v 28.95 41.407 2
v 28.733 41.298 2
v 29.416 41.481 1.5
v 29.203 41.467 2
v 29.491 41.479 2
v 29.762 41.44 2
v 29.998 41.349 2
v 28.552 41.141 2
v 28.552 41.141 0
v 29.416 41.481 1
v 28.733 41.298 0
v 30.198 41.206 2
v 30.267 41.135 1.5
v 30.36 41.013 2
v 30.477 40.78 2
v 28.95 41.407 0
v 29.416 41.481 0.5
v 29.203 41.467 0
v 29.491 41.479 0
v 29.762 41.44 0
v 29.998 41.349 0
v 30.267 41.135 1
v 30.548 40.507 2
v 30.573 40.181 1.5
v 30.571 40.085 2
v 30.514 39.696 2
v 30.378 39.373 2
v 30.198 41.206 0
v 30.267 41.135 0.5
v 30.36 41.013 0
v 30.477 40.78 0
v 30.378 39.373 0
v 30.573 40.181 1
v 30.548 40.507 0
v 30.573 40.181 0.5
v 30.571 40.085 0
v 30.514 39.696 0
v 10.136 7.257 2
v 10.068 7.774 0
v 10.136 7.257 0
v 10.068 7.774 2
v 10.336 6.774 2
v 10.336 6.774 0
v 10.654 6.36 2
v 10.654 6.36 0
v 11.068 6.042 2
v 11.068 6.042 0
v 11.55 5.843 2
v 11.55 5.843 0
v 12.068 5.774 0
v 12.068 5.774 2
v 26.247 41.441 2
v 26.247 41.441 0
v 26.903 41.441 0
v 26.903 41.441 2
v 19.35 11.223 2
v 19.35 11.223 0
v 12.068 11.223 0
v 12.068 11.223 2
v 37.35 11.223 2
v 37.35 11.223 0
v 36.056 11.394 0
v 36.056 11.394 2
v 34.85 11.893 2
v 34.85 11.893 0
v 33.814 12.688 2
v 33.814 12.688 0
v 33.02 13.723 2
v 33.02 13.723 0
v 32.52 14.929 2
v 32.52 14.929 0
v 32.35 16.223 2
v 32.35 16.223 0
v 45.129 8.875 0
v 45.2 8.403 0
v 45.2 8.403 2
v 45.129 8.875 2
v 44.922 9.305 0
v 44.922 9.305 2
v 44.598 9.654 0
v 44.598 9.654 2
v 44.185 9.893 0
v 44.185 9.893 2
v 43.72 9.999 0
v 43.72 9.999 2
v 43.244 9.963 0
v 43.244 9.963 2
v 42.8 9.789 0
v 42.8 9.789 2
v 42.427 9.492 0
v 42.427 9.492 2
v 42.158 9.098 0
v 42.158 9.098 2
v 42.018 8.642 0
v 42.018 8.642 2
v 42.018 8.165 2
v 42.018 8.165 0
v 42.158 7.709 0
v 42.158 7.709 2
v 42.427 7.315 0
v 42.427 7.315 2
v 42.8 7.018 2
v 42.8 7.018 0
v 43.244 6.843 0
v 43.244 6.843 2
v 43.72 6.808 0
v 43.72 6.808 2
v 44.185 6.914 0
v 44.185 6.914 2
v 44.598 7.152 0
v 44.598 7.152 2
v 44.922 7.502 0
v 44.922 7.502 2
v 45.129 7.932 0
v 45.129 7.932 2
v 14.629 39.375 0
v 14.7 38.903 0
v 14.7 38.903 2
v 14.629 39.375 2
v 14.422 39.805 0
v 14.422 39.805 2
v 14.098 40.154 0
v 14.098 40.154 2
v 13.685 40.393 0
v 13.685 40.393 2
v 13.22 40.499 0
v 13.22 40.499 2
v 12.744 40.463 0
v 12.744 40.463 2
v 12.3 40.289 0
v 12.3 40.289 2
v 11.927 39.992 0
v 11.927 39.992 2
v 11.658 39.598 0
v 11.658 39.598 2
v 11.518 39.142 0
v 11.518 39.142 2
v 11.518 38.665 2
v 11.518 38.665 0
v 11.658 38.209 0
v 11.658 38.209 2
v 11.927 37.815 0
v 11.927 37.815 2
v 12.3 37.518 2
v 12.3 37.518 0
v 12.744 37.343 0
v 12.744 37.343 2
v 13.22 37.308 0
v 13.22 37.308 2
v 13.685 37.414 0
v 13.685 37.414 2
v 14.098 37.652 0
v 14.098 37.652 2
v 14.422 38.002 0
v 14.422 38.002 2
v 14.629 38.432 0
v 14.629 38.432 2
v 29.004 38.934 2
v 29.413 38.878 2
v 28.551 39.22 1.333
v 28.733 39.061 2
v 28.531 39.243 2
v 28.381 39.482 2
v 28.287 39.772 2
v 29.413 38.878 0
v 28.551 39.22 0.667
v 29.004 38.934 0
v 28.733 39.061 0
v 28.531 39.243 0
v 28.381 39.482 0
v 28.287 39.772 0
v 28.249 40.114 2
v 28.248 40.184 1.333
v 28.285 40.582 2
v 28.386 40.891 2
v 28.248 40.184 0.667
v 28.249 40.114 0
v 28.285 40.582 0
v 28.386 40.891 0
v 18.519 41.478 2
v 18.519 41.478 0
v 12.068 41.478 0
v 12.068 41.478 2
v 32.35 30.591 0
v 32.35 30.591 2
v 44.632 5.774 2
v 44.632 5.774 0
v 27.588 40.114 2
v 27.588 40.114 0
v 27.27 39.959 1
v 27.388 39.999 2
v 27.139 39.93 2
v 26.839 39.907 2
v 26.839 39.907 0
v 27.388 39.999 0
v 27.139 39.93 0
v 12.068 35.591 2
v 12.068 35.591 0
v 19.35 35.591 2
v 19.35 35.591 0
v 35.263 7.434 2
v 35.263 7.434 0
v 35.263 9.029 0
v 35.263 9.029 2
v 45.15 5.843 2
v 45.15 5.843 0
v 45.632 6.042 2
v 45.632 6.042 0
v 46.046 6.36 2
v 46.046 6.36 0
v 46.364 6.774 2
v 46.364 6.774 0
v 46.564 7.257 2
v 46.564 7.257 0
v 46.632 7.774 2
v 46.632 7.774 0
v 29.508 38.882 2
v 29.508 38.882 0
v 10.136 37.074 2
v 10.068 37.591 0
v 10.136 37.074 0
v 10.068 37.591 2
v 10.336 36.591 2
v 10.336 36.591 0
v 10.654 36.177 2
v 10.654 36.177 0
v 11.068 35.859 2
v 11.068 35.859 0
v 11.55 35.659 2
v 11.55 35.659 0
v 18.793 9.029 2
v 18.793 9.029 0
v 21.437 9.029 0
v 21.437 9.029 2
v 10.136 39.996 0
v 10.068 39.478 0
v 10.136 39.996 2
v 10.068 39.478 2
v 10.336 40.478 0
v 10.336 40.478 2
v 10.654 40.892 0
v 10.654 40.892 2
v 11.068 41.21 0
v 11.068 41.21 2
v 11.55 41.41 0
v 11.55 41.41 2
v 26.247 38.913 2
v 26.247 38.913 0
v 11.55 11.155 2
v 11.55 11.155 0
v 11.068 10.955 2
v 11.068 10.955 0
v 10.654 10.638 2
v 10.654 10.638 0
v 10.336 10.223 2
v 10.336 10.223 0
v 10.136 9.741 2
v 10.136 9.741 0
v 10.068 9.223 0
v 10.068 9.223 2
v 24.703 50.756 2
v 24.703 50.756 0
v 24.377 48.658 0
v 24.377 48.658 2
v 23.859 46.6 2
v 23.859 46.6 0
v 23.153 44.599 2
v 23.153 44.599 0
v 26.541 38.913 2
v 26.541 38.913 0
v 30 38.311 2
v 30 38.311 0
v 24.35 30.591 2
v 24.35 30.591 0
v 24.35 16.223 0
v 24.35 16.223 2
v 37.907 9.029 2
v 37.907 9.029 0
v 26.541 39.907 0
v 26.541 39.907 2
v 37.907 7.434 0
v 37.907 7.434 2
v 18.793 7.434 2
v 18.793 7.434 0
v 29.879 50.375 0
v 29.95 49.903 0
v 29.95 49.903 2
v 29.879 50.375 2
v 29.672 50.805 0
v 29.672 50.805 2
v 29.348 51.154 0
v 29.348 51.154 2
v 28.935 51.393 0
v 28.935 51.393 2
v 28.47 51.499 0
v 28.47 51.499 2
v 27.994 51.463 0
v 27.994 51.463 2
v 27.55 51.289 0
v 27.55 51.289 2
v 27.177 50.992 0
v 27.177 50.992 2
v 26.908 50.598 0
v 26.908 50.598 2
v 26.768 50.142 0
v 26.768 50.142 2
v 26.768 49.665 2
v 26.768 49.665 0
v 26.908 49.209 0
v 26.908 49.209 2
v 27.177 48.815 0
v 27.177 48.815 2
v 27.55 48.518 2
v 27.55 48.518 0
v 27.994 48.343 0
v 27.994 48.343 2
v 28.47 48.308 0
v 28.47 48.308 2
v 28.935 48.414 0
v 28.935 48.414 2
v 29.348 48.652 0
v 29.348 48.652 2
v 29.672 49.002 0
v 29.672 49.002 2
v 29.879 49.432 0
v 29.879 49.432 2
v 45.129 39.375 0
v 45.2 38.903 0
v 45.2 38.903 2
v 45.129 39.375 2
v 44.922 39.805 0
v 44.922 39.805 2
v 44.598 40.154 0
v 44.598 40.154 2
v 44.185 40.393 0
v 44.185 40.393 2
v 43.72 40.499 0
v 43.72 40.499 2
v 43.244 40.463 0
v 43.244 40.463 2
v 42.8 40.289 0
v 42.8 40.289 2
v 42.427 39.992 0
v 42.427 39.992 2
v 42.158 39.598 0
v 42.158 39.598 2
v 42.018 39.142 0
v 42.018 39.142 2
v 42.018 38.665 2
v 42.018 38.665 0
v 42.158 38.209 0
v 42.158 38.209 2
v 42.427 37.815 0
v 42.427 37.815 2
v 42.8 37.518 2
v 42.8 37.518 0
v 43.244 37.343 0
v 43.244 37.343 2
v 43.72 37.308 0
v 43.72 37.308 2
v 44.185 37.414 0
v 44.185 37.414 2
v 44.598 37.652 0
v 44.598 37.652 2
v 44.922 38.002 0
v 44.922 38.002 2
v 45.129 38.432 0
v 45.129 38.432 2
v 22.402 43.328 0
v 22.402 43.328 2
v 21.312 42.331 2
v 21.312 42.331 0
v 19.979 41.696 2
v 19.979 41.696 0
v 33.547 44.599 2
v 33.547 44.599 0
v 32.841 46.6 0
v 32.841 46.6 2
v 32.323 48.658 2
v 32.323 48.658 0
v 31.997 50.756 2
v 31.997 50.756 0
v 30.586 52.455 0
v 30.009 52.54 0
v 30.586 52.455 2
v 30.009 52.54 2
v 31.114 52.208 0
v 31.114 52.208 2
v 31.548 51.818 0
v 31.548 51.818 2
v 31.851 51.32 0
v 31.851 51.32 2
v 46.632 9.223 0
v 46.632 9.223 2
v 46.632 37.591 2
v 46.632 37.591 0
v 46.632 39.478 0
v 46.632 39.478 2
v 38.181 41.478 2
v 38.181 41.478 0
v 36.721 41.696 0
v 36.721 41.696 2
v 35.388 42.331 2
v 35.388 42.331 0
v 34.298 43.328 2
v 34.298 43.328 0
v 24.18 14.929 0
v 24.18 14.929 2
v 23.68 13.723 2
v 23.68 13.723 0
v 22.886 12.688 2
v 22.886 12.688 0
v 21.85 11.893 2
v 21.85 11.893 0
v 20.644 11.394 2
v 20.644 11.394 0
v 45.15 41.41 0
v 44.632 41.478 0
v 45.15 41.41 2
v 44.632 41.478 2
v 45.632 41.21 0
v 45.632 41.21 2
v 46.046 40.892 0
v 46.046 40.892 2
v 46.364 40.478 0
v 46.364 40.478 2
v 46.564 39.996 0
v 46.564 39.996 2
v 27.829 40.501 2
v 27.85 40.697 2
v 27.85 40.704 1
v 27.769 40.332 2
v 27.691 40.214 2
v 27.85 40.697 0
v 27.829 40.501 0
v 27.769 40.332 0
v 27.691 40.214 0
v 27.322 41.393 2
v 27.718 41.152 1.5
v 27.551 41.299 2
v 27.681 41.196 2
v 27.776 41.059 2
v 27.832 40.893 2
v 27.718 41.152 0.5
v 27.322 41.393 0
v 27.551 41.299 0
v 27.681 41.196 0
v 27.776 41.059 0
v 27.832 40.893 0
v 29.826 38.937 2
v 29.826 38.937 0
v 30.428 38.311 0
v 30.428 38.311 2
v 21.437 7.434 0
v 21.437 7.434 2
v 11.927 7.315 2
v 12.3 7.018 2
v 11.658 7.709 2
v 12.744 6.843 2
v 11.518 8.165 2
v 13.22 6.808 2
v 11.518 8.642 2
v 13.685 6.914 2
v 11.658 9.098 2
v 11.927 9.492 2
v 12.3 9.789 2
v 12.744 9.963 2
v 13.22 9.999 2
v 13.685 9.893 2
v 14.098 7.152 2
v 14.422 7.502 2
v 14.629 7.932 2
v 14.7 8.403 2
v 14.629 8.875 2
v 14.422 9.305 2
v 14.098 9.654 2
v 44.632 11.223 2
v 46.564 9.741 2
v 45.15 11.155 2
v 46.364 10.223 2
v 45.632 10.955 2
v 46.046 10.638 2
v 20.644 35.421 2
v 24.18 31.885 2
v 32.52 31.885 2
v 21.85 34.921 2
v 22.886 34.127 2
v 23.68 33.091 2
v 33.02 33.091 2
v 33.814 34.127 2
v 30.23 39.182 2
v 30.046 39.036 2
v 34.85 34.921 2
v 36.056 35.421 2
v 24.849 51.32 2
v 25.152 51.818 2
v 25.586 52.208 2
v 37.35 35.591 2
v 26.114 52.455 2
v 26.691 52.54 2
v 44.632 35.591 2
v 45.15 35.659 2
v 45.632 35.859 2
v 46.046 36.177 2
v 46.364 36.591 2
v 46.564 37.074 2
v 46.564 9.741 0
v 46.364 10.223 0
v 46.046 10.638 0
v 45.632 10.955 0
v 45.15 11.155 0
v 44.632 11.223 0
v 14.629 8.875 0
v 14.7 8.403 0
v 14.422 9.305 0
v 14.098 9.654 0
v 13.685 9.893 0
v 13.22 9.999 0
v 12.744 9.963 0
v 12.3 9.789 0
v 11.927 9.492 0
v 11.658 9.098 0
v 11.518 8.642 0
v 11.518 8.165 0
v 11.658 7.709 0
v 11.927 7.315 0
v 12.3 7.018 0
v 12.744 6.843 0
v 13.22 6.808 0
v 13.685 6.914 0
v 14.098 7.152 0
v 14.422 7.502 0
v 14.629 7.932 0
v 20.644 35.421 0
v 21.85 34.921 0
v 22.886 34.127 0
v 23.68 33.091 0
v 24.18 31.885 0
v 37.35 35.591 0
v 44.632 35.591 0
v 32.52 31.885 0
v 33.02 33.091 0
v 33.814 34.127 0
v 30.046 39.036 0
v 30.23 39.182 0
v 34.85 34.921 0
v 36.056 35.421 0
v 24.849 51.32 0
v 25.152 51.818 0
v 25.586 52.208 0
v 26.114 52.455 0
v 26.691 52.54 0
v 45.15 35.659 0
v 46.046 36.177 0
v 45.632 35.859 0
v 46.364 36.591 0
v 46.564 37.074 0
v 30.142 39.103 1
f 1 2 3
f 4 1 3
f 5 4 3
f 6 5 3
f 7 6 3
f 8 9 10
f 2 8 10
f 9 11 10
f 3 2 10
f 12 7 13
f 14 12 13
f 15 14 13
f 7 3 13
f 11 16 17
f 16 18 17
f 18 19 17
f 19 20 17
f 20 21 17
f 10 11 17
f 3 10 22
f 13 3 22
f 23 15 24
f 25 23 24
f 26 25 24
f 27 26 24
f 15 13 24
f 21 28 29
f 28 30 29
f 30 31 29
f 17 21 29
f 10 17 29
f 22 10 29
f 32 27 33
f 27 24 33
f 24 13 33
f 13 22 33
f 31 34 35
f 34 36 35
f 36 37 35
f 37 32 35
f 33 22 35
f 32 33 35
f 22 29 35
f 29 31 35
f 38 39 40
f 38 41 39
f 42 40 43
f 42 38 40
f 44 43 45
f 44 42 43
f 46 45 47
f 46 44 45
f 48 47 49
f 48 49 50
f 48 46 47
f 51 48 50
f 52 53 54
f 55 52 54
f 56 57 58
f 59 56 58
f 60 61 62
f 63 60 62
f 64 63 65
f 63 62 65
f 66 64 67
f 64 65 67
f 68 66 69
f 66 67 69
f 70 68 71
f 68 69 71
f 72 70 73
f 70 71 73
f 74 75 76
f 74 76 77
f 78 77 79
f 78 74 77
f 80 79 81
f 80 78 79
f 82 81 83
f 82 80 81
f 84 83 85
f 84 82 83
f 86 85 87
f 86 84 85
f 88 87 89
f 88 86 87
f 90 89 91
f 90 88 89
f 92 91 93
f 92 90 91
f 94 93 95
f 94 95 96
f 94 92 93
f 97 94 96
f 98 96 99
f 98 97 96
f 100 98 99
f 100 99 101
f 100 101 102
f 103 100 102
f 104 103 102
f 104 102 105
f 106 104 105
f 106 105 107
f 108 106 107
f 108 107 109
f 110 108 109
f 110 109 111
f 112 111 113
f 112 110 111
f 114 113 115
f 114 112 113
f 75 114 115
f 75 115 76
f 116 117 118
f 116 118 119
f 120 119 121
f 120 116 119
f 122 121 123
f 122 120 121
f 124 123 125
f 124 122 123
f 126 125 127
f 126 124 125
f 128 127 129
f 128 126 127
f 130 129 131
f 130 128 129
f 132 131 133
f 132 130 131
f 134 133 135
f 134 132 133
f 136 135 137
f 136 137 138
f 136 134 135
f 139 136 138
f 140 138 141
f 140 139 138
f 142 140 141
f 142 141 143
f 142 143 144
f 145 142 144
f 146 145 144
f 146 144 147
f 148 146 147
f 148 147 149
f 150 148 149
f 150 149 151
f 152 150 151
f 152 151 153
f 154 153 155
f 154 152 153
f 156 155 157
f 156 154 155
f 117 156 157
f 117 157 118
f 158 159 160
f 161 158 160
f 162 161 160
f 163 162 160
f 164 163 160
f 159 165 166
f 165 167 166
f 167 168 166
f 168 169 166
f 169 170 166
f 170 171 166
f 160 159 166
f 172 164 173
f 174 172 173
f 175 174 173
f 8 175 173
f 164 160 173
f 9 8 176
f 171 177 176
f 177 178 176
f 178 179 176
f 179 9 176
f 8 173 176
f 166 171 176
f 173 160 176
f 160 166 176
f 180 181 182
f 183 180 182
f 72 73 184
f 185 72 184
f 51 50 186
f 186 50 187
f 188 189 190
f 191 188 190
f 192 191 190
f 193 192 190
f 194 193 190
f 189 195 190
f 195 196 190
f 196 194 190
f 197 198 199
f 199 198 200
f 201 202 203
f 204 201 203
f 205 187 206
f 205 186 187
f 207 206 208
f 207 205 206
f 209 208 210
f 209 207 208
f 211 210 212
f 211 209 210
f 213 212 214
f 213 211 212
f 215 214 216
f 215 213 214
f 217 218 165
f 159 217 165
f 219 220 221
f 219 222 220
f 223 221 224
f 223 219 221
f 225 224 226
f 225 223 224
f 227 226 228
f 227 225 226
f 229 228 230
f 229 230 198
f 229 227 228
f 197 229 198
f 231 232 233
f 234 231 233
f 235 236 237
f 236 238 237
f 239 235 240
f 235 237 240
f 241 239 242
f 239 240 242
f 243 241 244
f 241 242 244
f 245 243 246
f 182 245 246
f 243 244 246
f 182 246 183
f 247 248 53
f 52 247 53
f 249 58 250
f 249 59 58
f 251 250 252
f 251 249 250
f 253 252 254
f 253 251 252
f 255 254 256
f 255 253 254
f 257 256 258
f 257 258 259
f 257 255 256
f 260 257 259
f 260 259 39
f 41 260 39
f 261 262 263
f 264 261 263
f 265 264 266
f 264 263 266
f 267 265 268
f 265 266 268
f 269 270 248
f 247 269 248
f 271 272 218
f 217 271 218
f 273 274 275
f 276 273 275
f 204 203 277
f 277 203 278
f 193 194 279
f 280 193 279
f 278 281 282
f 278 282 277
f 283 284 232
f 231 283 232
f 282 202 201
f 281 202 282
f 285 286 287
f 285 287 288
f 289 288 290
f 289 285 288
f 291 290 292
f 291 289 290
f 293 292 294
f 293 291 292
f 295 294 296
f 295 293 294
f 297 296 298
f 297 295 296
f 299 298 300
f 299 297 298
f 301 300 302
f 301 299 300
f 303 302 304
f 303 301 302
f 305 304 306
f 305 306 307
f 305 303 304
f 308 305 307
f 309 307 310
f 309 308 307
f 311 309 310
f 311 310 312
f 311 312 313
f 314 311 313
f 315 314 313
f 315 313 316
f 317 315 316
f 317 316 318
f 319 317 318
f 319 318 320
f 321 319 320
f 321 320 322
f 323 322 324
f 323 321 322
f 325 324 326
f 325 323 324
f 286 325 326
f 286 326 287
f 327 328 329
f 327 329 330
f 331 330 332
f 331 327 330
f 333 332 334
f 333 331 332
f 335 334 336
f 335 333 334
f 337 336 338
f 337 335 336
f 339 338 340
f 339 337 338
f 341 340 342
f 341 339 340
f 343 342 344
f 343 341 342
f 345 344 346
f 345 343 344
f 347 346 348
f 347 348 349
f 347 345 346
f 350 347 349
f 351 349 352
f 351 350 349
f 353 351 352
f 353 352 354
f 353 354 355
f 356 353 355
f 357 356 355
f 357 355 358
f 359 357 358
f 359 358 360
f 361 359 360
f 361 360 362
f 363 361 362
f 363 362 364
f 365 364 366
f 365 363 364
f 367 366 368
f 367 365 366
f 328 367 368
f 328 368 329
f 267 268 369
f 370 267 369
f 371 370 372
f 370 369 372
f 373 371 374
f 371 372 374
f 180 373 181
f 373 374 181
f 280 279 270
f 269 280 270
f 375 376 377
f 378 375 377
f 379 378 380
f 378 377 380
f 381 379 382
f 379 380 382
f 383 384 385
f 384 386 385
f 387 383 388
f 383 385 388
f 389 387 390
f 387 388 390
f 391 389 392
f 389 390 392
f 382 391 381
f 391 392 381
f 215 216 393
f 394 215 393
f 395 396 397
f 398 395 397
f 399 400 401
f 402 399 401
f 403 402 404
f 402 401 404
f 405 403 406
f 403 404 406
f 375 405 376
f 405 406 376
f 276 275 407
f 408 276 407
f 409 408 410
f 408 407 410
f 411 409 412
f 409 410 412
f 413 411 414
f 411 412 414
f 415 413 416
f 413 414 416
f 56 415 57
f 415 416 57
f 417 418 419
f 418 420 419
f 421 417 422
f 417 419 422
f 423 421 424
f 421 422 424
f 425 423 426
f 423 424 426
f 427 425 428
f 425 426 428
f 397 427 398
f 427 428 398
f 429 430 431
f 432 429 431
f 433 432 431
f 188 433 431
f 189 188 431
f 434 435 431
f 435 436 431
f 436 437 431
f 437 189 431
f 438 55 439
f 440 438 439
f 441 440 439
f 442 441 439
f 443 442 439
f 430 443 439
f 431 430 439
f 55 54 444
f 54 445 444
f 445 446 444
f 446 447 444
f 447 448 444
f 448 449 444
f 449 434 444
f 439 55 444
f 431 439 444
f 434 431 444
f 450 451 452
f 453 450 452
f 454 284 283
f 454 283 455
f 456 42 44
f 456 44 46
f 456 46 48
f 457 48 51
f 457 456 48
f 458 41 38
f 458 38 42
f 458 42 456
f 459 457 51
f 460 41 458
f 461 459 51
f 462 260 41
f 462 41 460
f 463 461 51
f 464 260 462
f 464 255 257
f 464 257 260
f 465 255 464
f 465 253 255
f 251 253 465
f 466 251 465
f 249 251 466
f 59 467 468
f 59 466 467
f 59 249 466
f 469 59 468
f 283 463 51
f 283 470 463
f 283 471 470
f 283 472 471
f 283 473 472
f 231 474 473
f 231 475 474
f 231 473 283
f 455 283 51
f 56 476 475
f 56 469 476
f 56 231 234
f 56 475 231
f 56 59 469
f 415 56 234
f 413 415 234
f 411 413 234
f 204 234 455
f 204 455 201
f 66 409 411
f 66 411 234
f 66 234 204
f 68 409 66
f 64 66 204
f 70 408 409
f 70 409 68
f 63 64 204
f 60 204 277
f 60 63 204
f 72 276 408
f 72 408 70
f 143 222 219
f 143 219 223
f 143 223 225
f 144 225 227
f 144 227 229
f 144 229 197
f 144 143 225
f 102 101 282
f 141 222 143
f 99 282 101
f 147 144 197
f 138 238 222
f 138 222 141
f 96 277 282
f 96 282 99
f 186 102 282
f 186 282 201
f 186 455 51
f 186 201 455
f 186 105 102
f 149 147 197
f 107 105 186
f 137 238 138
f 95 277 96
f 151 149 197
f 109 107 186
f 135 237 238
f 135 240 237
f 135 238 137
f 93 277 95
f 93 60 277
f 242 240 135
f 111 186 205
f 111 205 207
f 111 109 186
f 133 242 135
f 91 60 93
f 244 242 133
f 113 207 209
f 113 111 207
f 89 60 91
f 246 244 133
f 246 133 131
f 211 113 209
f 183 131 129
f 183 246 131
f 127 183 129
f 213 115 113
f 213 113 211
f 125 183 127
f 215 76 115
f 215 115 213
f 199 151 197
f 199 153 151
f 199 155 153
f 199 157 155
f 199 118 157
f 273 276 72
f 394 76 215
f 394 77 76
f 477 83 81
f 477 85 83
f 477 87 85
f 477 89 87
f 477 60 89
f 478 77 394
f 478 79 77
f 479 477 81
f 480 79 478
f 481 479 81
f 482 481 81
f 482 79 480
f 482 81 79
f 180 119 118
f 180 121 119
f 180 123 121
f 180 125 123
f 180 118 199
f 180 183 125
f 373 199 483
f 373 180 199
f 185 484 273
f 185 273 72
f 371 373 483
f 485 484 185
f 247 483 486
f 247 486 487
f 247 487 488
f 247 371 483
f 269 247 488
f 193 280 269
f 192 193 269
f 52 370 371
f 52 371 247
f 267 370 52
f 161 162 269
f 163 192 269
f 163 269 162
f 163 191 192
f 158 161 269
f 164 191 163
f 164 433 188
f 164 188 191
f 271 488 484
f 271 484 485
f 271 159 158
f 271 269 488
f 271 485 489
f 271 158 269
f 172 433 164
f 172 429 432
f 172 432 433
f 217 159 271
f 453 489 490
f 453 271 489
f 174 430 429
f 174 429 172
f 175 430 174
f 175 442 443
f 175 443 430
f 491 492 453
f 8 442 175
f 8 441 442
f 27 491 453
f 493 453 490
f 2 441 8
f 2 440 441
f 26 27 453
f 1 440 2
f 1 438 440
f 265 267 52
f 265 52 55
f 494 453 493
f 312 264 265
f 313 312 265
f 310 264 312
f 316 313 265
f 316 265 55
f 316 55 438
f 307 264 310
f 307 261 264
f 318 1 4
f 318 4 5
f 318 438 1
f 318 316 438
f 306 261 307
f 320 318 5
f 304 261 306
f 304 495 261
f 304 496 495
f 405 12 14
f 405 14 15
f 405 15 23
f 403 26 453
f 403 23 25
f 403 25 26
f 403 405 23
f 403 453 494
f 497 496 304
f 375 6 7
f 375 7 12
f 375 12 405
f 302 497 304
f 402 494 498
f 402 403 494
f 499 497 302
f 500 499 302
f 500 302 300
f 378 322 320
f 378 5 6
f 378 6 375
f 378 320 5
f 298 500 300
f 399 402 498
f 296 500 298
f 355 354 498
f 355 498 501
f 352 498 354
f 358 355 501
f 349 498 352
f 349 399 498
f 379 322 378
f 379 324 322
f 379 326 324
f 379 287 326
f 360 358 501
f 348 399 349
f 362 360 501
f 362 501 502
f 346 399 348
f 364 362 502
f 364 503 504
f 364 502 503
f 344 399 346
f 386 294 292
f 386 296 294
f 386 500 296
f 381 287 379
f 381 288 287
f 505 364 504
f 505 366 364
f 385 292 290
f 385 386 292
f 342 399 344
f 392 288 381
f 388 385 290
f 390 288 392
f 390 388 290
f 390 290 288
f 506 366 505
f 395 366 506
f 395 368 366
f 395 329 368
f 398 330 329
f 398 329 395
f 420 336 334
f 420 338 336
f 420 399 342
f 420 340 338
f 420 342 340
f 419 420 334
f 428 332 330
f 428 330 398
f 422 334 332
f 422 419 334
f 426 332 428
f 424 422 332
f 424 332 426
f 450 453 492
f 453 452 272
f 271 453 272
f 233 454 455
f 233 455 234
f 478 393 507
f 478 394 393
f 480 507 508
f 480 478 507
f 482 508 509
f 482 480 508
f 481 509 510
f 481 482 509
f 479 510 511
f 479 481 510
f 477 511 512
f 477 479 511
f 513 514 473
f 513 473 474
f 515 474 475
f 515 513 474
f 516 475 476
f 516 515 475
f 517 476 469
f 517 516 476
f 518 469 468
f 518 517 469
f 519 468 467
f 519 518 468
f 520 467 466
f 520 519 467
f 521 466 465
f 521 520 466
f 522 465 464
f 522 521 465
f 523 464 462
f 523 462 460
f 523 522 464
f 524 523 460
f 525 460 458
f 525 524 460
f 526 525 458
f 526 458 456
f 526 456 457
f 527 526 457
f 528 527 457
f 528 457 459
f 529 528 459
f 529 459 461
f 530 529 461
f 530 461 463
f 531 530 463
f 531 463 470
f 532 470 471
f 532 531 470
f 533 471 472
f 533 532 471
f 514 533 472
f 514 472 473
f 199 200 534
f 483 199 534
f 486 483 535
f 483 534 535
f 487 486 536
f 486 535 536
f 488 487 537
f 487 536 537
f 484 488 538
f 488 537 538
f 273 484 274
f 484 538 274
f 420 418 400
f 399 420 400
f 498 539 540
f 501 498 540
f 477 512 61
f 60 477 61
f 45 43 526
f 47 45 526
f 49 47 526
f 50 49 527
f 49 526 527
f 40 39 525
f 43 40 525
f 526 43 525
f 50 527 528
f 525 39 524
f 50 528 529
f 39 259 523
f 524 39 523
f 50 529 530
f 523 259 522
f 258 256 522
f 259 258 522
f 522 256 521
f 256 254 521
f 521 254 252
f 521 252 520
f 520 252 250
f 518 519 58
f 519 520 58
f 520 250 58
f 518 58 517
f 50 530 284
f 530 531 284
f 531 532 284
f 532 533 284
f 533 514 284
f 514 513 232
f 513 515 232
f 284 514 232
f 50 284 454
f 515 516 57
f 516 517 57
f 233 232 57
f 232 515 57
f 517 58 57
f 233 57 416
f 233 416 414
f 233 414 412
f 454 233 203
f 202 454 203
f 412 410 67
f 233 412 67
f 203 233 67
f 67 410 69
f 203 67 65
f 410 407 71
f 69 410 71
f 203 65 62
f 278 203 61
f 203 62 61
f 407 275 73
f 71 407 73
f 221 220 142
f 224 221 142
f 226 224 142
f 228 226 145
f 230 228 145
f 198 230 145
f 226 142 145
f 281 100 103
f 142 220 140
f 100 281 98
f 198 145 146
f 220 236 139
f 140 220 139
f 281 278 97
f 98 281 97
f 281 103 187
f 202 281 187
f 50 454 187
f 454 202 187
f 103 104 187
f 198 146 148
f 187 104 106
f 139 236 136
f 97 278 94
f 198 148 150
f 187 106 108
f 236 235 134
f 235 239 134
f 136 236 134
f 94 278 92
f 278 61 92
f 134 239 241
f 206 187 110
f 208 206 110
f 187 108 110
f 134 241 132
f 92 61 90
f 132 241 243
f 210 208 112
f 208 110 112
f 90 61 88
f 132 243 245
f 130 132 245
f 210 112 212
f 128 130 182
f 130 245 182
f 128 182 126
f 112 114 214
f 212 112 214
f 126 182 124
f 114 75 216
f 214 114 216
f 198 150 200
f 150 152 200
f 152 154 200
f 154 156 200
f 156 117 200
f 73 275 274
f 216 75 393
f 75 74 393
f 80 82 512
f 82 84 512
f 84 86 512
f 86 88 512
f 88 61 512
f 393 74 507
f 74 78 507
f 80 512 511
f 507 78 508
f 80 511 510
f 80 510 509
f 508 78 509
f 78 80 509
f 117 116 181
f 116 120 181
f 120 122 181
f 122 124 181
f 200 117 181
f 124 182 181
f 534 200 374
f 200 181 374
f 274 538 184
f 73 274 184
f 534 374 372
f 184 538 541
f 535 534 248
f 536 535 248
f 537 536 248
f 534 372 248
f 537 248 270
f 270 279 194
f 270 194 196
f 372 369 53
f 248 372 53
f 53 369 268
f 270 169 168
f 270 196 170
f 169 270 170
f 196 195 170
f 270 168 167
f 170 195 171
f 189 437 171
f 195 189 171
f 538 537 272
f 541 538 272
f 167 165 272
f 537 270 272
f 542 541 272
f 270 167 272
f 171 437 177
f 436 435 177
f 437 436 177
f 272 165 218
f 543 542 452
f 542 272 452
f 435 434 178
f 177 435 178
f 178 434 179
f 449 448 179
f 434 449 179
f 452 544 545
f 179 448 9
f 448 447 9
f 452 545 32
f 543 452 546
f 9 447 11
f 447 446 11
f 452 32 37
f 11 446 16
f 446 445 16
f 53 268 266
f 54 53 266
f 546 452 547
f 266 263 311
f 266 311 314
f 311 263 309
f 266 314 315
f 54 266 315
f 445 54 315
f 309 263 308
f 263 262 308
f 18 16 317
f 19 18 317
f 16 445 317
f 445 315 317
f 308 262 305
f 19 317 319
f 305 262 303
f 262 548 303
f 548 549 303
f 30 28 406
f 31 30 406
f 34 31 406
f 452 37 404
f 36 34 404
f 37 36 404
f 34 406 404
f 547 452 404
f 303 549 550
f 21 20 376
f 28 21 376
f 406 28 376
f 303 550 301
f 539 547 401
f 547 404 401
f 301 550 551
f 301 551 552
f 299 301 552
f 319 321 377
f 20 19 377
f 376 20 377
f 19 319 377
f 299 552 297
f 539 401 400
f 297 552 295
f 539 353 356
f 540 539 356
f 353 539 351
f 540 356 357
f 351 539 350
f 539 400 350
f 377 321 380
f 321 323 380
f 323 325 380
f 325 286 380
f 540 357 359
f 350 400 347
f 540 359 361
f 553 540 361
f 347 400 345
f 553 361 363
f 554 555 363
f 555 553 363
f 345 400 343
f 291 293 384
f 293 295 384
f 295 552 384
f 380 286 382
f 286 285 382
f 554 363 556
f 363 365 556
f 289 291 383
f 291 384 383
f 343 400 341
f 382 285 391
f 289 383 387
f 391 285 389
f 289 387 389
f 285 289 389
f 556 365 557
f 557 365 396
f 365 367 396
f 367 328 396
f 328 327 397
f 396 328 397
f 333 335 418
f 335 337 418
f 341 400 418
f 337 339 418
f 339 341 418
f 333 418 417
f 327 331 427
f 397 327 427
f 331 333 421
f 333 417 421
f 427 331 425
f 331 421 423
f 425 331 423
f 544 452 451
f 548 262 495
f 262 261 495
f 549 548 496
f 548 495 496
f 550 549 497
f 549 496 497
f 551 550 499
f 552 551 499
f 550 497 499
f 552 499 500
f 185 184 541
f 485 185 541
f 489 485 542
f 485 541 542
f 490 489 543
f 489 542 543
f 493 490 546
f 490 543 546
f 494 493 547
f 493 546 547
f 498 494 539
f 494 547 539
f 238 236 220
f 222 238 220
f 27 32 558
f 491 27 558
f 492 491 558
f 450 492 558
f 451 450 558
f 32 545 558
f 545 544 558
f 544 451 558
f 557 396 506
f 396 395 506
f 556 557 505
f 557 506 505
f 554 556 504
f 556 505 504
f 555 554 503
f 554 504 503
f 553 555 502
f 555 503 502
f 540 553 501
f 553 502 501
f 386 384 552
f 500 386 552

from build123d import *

# Parameters (mm, degrees)
F0_R     = 1.6
F0_W     = 2.644199878
F0_H     = 1.5956377611
F1_DEPTH = 2
F2_R     = 2
F3_R     = 2


with BuildPart() as f1:
    # F0 (on Top) → F1 (new body)
    with BuildSketch(Plane.XY):
        with BuildLine():
            Line((10.0678037852, 41.4781346917), (10.0678037852, 40.3846651316))
            Line((10.0678037852, 40.3846651316), (10.0678037852, 35.5912074447))
            Line((10.0678037852, 35.5912074447), (19.349999167, 35.5912074447))
            ThreePointArc((19.349999167, 35.5912074447), (22.885533073, 34.1267413506), (24.349999167, 30.5912074447))
            Line((24.349999167, 30.5912074447), (24.349999167, 16.2233320251))
            ThreePointArc((24.349999167, 16.2233320251), (22.885533073, 12.6877981192), (19.349999167, 11.2233320251))
            Line((19.349999167, 11.2233320251), (10.0678037852, 11.2233320251))
            Line((10.0678037852, 11.2233320251), (10.0678037852, 5.7744667865))
            Line((10.0678037852, 5.7744667865), (46.6321945488, 5.7744667865))
            Line((46.6321945488, 5.7744667865), (46.6321945488, 11.2233320251))
            Line((46.6321945488, 11.2233320251), (37.349999167, 11.2233320251))
            ThreePointArc((37.349999167, 11.2233320251), (33.8144652611, 12.6877981192), (32.349999167, 16.2233320251))
            Line((32.349999167, 16.2233320251), (32.349999167, 24.7527061179))
            Line((32.349999167, 24.7527061179), (32.349999167, 30.5912074447))
            ThreePointArc((32.349999167, 30.5912074447), (33.8144652611, 34.1267413506), (37.349999167, 35.5912074447))
            Line((37.349999167, 35.5912074447), (46.6321945488, 35.5912074447))
            Line((46.6321945488, 35.5912074447), (46.6321945488, 40.3846651316))
            Line((46.6321945488, 40.3846651316), (46.6321945488, 41.4781346917))
            Line((46.6321945488, 41.4781346917), (38.1808124264, 41.4781346917))
            ThreePointArc((38.1808124264, 41.4781346917), (35.3876764753, 42.3310403404), (33.5474530963, 44.5987780681))
            ThreePointArc((33.5474530963, 44.5987780681), (32.3571350428, 48.4950101781), (31.87418136, 52.5402836502))
            Line((31.87418136, 52.5402836502), (28.349999167, 52.5402836502))
            Line((28.349999167, 52.5402836502), (24.825816974, 52.5402836502))
            ThreePointArc((24.825816974, 52.5402836502), (24.3428632913, 48.4950101781), (23.1525452378, 44.5987780681))
            ThreePointArc((23.1525452378, 44.5987780681), (21.3123218588, 42.3310403404), (18.5191859077, 41.4781346917))
            Line((18.5191859077, 41.4781346917), (10.0678037852, 41.4781346917))
        make_face()
        with Locations((13.099999167, 8.40333011)):
            Circle(F0_R, mode=Mode.SUBTRACT)
        with Locations((20.1146285981, 8.2314335741)):
            Rectangle(F0_W, F0_H, mode=Mode.SUBTRACT)
        with Locations((36.585369736, 8.2314335741)):
            Rectangle(F0_W, F0_H, mode=Mode.SUBTRACT)
        with Locations((43.599999167, 8.40333011)):
            Circle(F0_R, mode=Mode.SUBTRACT)
        with Locations((13.099999167, 38.90333011)):
            Circle(F0_R, mode=Mode.SUBTRACT)
        with BuildLine():
            add(Edge.make_bspline(
                [(26.9028567943, 41.4408115782), (27.8500015435, 41.4408115782), (27.8500015435, 40.7044507948)],
                knots=[0, 0, 0, 1, 1, 1], degree=2))
            add(Edge.make_bspline(
                [(27.8500015435, 40.7044507948), (27.8500015435, 40.3205030986), (27.5880429928, 40.1138684235)],
                knots=[0, 0, 0, 1, 1, 1], degree=2))
            add(Edge.make_bspline(
                [(27.5880429928, 40.1138684235), (27.3260844422, 39.9072337483), (26.8386810987, 39.9072337483)],
                knots=[0, 0, 0, 1, 1, 1], degree=2))
            Line((26.8386810987, 39.9072337483), (26.5410386483, 39.9072337483))
            Line((26.5410386483, 39.9072337483), (26.5410386483, 38.913063705))
            Line((26.5410386483, 38.913063705), (26.2472688693, 38.913063705))
            Line((26.2472688693, 38.913063705), (26.2472688693, 41.4408115782))
            Line((26.2472688693, 41.4408115782), (26.9028567943, 41.4408115782))
        make_face(mode=Mode.SUBTRACT)
        with Locations((28.349999167, 49.90333011)):
            Circle(F0_R, mode=Mode.SUBTRACT)
        with BuildLine():
            add(Edge.make_bspline(
                [(30.2671016656, 41.1348705465), (30.5730426973, 40.7890963244), (30.5730426973, 40.1805336935)],
                knots=[0, 0, 0, 1, 1, 1], degree=2))
            add(Edge.make_bspline(
                [(30.5730426973, 40.1805336935), (30.5730426973, 39.6947900663), (30.3777494167, 39.37308173)],
                knots=[0, 0, 0, 1, 1, 1], degree=2))
            add(Edge.make_bspline(
                [(30.3777494167, 39.37308173), (30.1824561361, 39.0513733938), (29.8261703776, 38.9374062102)],
                knots=[0, 0, 0, 1, 1, 1], degree=2))
            Line((29.8261703776, 38.9374062102), (30.4275409047, 38.3111399391))
            Line((30.4275409047, 38.3111399391), (30.0004405856, 38.3111399391))
            Line((30.0004405856, 38.3111399391), (29.5080580933, 38.8820823347))
            Line((29.5080580933, 38.8820823347), (29.4129010274, 38.8782096634))
            add(Edge.make_bspline(
                [(29.4129010274, 38.8782096634), (28.8546831232, 38.8782096634), (28.5512316659, 39.2198345948)],
                knots=[0, 0, 0, 1, 1, 1], degree=2))
            add(Edge.make_bspline(
                [(28.5512316659, 39.2198345948), (28.2477802086, 39.5614595262), (28.2477802086, 40.183853126)],
                knots=[0, 0, 0, 1, 1, 1], degree=2))
            add(Edge.make_bspline(
                [(28.2477802086, 40.183853126), (28.2477802086, 40.801267577), (28.552061524, 41.1409561728)],
                knots=[0, 0, 0, 1, 1, 1], degree=2))
            add(Edge.make_bspline(
                [(28.552061524, 41.1409561728), (28.8563428395, 41.4806447686), (29.4162204599, 41.4806447686)],
                knots=[0, 0, 0, 1, 1, 1], degree=2))
            add(Edge.make_bspline(
                [(29.4162204599, 41.4806447686), (29.9611606339, 41.4806447686), (30.2671016656, 41.1348705465)],
                knots=[0, 0, 0, 1, 1, 1], degree=2))
        make_face(mode=Mode.SUBTRACT)
        with Locations((43.599999167, 38.90333011)):
            Circle(F0_R, mode=Mode.SUBTRACT)
    extrude(amount=F1_DEPTH)

    # F2
    f2_edges = [f1.edges().sort_by_distance(p)[0] for p in [
        (46.632195, 5.774467, 1),
        (10.067804, 5.774467, 1),
        (10.067804, 35.591207, 1),
        (46.632195, 35.591207, 1),
    ]]
    fillet(f2_edges, radius=F2_R)

    # F3
    f3_edges = [f1.edges().sort_by_distance(p)[0] for p in [
        (10.067804, 41.478135, 1),
        (46.632195, 41.478135, 1),
        (46.632195, 11.223332, 1),
        (10.067804, 11.223332, 1),
        (24.825817, 52.540284, 1),
        (31.874181, 52.540284, 1),
    ]]
    fillet(f3_edges, radius=F3_R)


solid = f1.part
